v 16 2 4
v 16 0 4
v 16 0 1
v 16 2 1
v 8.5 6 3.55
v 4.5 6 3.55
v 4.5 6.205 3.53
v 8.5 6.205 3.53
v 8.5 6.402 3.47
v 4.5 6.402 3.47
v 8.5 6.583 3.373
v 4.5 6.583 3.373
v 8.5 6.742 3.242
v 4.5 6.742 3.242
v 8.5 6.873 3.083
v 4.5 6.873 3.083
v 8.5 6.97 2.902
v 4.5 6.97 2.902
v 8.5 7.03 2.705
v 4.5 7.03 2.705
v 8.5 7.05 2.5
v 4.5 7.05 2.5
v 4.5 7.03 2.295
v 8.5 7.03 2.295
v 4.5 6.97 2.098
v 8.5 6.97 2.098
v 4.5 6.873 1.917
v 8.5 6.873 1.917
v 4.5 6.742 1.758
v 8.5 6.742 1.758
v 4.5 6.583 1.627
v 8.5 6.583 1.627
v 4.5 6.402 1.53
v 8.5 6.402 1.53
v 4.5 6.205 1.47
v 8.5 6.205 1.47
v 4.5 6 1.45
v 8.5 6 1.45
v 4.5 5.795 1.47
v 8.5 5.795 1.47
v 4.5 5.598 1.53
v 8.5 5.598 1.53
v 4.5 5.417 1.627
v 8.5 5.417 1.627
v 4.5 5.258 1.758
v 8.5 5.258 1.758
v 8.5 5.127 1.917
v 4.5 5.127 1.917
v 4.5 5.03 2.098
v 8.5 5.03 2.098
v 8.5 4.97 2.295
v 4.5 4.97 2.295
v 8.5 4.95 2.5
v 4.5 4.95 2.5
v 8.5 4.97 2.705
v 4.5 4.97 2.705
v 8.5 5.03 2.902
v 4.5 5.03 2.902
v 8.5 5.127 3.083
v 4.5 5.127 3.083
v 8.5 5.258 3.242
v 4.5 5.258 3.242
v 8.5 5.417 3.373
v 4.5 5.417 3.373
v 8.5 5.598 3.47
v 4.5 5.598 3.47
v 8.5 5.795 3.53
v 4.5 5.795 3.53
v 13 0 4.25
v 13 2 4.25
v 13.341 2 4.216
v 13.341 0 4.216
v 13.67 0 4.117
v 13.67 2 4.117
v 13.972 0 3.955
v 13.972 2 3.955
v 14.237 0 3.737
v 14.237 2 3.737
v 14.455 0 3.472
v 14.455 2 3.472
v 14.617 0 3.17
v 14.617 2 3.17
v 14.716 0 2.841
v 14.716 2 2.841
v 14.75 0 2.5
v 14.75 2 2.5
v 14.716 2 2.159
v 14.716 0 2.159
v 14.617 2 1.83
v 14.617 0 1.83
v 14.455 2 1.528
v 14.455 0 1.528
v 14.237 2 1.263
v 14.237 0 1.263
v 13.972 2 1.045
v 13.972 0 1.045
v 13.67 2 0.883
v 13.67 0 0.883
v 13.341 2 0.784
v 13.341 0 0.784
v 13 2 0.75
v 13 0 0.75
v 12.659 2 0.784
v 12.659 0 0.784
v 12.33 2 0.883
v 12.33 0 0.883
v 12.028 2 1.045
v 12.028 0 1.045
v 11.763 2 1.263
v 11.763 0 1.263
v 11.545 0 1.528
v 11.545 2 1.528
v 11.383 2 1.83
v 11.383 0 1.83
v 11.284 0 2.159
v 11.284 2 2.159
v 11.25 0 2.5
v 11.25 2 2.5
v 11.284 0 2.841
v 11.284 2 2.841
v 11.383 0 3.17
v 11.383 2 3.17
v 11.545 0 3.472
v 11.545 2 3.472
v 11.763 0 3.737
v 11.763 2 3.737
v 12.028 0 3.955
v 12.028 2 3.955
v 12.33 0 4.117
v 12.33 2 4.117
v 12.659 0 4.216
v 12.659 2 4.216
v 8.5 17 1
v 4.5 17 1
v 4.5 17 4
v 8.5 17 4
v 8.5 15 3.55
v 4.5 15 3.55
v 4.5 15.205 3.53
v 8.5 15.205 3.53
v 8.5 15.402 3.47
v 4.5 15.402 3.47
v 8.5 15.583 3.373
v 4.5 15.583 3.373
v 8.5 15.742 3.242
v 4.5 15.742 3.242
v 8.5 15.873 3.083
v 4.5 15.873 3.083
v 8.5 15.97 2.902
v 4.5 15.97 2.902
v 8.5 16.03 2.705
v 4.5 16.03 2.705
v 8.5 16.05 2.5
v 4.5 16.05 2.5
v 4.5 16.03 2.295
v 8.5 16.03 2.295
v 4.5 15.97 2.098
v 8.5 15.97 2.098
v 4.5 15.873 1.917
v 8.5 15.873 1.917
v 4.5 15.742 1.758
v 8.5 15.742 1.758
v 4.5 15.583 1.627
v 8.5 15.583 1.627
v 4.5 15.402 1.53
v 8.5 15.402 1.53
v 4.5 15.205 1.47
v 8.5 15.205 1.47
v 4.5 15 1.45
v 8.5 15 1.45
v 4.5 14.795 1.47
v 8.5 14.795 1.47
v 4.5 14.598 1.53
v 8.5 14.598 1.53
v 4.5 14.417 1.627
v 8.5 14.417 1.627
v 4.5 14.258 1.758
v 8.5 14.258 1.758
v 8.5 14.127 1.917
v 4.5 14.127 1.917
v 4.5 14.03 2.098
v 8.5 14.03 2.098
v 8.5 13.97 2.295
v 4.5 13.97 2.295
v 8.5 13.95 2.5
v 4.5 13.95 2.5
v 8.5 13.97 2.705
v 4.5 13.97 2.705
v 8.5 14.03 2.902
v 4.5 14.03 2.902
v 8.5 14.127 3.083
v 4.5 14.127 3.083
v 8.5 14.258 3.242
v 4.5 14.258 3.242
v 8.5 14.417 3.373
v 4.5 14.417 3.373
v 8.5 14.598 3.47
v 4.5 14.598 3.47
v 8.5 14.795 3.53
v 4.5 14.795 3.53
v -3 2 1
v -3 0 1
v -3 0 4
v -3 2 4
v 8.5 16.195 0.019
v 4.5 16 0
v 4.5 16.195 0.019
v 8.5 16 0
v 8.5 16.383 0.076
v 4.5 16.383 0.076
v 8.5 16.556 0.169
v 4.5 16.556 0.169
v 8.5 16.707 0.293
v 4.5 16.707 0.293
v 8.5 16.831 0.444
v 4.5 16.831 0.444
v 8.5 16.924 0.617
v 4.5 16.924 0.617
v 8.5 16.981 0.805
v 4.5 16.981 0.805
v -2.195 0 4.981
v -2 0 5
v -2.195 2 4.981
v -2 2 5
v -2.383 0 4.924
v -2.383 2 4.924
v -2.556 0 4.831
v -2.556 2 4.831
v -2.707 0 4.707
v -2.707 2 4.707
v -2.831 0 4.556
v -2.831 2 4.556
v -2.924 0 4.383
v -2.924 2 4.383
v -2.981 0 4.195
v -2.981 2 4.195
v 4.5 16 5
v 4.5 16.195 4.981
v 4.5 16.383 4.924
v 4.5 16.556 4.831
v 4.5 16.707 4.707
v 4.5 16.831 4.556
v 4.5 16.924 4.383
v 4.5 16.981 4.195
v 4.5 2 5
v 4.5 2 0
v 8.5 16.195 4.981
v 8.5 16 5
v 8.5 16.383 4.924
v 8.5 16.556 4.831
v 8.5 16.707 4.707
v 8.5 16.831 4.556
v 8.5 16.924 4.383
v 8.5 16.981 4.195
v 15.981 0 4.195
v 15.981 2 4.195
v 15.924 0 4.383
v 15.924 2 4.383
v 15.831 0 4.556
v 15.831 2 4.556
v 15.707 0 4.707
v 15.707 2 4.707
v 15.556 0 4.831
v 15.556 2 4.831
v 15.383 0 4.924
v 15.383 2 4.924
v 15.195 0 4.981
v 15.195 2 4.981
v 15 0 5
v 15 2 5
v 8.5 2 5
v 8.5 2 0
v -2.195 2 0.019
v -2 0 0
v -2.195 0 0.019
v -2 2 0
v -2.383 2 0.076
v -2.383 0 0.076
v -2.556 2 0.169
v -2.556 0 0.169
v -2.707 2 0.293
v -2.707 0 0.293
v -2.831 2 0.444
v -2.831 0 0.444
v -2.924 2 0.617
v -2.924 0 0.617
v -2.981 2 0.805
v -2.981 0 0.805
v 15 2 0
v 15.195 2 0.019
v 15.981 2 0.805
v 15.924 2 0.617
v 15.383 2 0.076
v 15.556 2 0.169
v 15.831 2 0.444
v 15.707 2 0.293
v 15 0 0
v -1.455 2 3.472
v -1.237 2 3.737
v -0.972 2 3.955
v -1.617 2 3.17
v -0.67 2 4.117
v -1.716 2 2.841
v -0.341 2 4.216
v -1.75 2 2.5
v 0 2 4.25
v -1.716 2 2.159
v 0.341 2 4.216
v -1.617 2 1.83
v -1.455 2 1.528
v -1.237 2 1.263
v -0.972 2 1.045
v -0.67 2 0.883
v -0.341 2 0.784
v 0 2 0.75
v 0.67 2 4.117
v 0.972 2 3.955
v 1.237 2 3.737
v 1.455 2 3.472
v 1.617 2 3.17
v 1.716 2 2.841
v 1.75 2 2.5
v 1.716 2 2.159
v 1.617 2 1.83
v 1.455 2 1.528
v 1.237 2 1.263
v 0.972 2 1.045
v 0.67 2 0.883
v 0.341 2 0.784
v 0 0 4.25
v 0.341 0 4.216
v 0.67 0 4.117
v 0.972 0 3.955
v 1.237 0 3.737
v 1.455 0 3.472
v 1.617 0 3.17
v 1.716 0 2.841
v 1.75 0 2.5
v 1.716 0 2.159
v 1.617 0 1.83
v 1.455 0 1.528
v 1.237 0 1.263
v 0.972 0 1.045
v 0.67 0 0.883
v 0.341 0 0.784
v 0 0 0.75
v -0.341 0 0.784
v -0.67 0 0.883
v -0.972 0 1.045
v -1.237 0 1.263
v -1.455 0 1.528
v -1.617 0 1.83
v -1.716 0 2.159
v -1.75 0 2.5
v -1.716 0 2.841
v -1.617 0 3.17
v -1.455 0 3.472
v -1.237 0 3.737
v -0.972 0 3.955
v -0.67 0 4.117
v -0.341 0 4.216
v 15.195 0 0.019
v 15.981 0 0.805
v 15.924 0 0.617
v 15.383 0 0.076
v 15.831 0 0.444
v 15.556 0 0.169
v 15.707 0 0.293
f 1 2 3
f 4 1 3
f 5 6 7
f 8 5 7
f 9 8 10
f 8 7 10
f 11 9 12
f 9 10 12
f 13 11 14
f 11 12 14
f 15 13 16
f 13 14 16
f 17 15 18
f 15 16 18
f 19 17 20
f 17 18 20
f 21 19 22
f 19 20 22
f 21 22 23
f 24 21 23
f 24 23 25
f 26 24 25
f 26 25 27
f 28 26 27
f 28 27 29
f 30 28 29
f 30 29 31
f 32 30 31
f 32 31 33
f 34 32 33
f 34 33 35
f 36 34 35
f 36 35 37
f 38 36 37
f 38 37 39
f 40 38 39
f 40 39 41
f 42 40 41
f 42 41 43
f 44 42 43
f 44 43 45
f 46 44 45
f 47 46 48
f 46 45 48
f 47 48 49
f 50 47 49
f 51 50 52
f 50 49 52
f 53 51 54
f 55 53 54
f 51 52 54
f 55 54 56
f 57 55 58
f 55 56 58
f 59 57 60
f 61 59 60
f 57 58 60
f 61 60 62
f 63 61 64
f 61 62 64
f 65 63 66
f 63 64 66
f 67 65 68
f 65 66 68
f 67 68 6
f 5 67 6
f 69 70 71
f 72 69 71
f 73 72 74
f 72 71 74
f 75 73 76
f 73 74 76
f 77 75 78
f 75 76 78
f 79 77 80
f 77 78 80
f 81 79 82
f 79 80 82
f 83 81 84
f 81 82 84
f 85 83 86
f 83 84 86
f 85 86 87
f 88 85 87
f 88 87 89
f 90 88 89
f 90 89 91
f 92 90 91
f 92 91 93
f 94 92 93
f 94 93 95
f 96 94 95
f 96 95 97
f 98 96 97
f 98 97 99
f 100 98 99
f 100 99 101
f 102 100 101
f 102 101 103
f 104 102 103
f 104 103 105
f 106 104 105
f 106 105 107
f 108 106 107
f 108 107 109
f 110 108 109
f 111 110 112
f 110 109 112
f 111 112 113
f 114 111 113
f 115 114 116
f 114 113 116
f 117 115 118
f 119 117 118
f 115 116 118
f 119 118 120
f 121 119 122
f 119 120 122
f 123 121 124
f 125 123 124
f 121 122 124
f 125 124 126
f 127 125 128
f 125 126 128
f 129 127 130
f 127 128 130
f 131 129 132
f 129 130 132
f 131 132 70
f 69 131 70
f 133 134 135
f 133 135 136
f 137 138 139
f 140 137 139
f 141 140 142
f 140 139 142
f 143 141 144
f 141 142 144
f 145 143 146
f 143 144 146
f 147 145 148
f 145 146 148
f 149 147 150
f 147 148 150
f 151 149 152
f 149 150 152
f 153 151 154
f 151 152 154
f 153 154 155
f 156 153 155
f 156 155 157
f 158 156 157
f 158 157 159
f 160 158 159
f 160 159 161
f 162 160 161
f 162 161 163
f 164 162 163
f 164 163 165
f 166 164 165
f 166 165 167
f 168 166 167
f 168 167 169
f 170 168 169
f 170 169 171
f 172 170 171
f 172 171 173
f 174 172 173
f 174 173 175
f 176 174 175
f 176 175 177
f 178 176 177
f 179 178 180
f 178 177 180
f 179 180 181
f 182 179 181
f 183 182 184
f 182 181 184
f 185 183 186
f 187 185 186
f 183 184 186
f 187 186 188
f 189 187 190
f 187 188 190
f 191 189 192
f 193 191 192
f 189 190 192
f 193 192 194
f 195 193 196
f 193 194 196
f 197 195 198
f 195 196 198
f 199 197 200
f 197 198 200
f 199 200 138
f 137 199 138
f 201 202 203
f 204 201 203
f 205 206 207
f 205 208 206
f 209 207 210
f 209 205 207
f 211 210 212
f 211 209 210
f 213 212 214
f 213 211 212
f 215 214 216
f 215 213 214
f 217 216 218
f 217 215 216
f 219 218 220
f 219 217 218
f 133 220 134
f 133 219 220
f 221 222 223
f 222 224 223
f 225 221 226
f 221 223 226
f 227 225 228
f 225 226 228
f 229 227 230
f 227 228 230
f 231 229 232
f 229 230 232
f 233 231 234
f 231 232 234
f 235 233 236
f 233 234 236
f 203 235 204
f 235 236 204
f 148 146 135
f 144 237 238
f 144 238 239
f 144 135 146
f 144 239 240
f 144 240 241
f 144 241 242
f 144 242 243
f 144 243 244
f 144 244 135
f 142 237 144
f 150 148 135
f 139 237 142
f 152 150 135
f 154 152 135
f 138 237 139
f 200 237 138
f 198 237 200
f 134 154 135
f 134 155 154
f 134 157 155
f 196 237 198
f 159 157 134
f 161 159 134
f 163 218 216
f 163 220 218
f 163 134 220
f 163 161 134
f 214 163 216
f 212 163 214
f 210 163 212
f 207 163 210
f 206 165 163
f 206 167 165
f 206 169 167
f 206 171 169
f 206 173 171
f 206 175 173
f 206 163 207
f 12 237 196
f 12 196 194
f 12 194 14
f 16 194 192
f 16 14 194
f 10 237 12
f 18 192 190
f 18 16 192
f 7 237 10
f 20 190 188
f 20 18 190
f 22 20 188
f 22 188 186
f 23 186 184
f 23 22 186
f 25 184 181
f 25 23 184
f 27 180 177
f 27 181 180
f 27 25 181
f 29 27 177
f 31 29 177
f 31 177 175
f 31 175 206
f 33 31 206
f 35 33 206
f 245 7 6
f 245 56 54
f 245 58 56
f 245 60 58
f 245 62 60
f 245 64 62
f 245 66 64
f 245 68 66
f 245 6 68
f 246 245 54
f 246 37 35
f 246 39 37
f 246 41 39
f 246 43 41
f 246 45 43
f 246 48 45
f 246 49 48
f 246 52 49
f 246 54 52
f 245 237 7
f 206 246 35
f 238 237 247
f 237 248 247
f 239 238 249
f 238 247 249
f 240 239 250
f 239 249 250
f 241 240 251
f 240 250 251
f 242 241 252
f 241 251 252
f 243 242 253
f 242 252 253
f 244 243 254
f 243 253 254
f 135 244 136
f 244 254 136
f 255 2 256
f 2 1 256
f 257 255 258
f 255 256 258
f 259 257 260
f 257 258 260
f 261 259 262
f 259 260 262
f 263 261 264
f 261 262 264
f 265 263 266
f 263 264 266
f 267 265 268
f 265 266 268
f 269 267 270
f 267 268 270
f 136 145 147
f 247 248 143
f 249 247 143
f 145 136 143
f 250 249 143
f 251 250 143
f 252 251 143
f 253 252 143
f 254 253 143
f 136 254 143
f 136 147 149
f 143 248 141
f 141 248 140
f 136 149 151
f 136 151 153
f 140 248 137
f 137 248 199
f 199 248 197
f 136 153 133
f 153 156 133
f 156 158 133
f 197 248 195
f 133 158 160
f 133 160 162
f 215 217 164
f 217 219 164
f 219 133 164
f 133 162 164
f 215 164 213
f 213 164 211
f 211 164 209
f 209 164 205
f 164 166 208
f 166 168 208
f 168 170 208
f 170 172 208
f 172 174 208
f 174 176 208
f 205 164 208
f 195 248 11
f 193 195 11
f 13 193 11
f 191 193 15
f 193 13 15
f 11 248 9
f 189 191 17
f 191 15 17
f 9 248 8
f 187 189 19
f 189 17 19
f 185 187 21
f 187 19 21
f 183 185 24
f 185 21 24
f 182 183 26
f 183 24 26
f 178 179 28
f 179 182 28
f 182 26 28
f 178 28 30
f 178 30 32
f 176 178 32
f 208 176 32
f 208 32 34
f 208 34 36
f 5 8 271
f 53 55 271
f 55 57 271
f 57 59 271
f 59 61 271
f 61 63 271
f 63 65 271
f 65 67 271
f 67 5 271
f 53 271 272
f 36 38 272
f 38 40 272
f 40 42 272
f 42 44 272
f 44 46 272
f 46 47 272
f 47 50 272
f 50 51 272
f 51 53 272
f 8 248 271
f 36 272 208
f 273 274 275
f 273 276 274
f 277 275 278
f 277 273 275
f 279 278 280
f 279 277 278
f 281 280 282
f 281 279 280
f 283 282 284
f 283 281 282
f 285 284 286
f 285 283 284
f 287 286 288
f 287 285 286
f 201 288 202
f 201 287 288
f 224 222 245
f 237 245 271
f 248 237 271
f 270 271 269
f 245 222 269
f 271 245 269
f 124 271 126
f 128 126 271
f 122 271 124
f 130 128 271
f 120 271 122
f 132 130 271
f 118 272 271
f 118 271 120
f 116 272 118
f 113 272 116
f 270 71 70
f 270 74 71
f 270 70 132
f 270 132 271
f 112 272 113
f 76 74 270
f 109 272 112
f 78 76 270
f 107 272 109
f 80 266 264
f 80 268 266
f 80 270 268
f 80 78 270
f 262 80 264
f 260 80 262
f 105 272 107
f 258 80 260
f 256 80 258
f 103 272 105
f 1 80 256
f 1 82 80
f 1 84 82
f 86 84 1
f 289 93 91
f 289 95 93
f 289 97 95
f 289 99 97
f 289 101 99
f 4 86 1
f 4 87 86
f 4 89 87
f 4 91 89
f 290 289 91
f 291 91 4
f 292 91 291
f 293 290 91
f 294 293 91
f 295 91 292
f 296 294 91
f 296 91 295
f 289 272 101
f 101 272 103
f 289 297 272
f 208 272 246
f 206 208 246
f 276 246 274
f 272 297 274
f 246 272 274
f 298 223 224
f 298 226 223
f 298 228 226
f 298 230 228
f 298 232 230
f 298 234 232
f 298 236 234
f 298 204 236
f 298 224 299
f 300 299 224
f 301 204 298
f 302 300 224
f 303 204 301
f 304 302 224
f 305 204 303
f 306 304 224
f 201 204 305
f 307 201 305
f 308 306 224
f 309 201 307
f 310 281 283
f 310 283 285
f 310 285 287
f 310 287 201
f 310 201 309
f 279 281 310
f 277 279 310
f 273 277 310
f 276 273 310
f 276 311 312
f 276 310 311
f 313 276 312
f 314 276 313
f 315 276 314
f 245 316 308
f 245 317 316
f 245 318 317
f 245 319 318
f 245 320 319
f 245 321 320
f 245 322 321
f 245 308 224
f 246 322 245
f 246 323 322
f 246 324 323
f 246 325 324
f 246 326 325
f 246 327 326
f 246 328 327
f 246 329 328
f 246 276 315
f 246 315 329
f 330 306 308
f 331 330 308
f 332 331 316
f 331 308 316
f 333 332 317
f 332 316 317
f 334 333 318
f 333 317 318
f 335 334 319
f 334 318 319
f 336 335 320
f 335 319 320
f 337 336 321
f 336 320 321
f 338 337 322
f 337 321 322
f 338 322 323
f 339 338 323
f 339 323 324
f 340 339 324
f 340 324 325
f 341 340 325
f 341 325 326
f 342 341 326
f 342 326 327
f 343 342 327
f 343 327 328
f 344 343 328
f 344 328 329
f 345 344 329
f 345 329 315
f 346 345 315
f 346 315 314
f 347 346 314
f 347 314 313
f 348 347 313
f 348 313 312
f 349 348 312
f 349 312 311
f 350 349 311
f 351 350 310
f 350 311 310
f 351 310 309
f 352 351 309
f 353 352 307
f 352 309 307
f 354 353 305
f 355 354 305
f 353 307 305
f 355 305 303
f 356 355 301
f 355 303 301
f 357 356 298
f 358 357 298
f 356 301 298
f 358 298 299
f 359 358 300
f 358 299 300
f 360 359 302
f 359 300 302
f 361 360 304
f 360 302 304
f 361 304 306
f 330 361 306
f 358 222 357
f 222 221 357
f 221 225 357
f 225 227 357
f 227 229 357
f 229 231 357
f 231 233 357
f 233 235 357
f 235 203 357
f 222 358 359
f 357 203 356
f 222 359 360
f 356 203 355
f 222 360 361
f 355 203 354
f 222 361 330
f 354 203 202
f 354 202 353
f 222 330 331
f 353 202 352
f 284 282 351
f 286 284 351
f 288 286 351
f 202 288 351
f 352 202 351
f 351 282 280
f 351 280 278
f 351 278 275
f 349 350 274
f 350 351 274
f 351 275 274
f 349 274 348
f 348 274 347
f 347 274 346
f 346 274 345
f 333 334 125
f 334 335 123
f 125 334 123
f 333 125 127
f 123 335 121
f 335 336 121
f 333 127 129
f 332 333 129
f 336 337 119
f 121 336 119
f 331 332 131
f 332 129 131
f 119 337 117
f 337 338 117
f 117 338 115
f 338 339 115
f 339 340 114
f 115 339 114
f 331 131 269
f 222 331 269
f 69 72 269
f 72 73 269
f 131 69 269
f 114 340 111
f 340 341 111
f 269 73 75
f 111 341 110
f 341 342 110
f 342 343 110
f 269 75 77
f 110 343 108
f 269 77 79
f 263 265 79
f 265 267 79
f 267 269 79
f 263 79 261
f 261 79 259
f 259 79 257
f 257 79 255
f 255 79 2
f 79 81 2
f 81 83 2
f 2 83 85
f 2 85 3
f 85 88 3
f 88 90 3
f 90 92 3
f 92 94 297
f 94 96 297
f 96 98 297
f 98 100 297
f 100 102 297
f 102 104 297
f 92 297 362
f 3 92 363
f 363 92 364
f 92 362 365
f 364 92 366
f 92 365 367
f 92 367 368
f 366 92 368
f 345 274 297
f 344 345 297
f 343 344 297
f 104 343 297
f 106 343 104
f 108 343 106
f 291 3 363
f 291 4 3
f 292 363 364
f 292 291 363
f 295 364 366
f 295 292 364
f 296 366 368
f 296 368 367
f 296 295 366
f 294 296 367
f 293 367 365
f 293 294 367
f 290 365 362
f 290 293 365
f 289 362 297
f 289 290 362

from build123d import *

# Parameters (mm, degrees)
EXTRUDE_1_DEPTH     = 2
SKETCH_2_W          = 4
SKETCH_2_H          = 5
EXTRUDE_2_DEPTH     = 15
SKETCH_3_R          = 1.05
CUT_EXTRUDE_1_DEPTH = 12
SKETCH_5_R          = 1.75
CUT_EXTRUDE_2_DEPTH = 12
FILLET_1_R          = 1
FILLET_2_R          = 1


with BuildPart() as part:
    # 草图1 → 凸台-拉伸1 (new body)
    with BuildSketch(Plane(origin=(0, 0, 0), x_dir=(1, 0, 0), z_dir=(0, 1, 0))):
        Polygon((0, -5), (13, -5), (16, -5), (16, 0), (13, 0), (0, 0), (-3, 0), (-3, -5), align=None)
    extrude(amount=EXTRUDE_1_DEPTH)

    # 草图2 → 凸台-拉伸2 (add)
    with BuildSketch(Plane(origin=(0, 2, 0), x_dir=(1, 0, 0), z_dir=(0, 1, 0))):
        with Locations((6.5, -2.5)):
            Rectangle(SKETCH_2_W, SKETCH_2_H)
    extrude(amount=EXTRUDE_2_DEPTH)

    # 草图3 → 切除-拉伸1 (cut)
    with BuildSketch(Plane.ZY.offset(-4.5)):
        with Locations((2.5, 15)):
            Circle(SKETCH_3_R)
        with Locations((2.5, 6)):
            Circle(SKETCH_3_R)
    extrude(amount=-CUT_EXTRUDE_1_DEPTH, mode=Mode.SUBTRACT)

    # 草图5 → 切除-拉伸2 (cut)
    with BuildSketch(Plane(origin=(0, 2, 0), x_dir=(1, 0, 0), z_dir=(0, 1, 0))):
        with Locations(Location((0, -2.5, 0), (0, 0, 270))):
            Circle(SKETCH_5_R)
        with Locations(Location((13, -2.5, 0), (0, 0, 270))):
            Circle(SKETCH_5_R)
    extrude(amount=-CUT_EXTRUDE_2_DEPTH, mode=Mode.SUBTRACT)

    # 圆角1
    fillet_1_edges = [part.edges().sort_by_distance(p)[0] for p in [
        (16, 1, 0),
        (16, 1, 5),
        (-3, 1, 5),
        (-3, 1, 0),
    ]]
    fillet(fillet_1_edges, radius=FILLET_1_R)

    # 圆角2
    fillet_2_edges = [part.edges().sort_by_distance(p)[0] for p in [
        (6.5, 17, 0),
        (6.5, 17, 5),
    ]]
    fillet(fillet_2_edges, radius=FILLET_2_R)


solid = part.part
